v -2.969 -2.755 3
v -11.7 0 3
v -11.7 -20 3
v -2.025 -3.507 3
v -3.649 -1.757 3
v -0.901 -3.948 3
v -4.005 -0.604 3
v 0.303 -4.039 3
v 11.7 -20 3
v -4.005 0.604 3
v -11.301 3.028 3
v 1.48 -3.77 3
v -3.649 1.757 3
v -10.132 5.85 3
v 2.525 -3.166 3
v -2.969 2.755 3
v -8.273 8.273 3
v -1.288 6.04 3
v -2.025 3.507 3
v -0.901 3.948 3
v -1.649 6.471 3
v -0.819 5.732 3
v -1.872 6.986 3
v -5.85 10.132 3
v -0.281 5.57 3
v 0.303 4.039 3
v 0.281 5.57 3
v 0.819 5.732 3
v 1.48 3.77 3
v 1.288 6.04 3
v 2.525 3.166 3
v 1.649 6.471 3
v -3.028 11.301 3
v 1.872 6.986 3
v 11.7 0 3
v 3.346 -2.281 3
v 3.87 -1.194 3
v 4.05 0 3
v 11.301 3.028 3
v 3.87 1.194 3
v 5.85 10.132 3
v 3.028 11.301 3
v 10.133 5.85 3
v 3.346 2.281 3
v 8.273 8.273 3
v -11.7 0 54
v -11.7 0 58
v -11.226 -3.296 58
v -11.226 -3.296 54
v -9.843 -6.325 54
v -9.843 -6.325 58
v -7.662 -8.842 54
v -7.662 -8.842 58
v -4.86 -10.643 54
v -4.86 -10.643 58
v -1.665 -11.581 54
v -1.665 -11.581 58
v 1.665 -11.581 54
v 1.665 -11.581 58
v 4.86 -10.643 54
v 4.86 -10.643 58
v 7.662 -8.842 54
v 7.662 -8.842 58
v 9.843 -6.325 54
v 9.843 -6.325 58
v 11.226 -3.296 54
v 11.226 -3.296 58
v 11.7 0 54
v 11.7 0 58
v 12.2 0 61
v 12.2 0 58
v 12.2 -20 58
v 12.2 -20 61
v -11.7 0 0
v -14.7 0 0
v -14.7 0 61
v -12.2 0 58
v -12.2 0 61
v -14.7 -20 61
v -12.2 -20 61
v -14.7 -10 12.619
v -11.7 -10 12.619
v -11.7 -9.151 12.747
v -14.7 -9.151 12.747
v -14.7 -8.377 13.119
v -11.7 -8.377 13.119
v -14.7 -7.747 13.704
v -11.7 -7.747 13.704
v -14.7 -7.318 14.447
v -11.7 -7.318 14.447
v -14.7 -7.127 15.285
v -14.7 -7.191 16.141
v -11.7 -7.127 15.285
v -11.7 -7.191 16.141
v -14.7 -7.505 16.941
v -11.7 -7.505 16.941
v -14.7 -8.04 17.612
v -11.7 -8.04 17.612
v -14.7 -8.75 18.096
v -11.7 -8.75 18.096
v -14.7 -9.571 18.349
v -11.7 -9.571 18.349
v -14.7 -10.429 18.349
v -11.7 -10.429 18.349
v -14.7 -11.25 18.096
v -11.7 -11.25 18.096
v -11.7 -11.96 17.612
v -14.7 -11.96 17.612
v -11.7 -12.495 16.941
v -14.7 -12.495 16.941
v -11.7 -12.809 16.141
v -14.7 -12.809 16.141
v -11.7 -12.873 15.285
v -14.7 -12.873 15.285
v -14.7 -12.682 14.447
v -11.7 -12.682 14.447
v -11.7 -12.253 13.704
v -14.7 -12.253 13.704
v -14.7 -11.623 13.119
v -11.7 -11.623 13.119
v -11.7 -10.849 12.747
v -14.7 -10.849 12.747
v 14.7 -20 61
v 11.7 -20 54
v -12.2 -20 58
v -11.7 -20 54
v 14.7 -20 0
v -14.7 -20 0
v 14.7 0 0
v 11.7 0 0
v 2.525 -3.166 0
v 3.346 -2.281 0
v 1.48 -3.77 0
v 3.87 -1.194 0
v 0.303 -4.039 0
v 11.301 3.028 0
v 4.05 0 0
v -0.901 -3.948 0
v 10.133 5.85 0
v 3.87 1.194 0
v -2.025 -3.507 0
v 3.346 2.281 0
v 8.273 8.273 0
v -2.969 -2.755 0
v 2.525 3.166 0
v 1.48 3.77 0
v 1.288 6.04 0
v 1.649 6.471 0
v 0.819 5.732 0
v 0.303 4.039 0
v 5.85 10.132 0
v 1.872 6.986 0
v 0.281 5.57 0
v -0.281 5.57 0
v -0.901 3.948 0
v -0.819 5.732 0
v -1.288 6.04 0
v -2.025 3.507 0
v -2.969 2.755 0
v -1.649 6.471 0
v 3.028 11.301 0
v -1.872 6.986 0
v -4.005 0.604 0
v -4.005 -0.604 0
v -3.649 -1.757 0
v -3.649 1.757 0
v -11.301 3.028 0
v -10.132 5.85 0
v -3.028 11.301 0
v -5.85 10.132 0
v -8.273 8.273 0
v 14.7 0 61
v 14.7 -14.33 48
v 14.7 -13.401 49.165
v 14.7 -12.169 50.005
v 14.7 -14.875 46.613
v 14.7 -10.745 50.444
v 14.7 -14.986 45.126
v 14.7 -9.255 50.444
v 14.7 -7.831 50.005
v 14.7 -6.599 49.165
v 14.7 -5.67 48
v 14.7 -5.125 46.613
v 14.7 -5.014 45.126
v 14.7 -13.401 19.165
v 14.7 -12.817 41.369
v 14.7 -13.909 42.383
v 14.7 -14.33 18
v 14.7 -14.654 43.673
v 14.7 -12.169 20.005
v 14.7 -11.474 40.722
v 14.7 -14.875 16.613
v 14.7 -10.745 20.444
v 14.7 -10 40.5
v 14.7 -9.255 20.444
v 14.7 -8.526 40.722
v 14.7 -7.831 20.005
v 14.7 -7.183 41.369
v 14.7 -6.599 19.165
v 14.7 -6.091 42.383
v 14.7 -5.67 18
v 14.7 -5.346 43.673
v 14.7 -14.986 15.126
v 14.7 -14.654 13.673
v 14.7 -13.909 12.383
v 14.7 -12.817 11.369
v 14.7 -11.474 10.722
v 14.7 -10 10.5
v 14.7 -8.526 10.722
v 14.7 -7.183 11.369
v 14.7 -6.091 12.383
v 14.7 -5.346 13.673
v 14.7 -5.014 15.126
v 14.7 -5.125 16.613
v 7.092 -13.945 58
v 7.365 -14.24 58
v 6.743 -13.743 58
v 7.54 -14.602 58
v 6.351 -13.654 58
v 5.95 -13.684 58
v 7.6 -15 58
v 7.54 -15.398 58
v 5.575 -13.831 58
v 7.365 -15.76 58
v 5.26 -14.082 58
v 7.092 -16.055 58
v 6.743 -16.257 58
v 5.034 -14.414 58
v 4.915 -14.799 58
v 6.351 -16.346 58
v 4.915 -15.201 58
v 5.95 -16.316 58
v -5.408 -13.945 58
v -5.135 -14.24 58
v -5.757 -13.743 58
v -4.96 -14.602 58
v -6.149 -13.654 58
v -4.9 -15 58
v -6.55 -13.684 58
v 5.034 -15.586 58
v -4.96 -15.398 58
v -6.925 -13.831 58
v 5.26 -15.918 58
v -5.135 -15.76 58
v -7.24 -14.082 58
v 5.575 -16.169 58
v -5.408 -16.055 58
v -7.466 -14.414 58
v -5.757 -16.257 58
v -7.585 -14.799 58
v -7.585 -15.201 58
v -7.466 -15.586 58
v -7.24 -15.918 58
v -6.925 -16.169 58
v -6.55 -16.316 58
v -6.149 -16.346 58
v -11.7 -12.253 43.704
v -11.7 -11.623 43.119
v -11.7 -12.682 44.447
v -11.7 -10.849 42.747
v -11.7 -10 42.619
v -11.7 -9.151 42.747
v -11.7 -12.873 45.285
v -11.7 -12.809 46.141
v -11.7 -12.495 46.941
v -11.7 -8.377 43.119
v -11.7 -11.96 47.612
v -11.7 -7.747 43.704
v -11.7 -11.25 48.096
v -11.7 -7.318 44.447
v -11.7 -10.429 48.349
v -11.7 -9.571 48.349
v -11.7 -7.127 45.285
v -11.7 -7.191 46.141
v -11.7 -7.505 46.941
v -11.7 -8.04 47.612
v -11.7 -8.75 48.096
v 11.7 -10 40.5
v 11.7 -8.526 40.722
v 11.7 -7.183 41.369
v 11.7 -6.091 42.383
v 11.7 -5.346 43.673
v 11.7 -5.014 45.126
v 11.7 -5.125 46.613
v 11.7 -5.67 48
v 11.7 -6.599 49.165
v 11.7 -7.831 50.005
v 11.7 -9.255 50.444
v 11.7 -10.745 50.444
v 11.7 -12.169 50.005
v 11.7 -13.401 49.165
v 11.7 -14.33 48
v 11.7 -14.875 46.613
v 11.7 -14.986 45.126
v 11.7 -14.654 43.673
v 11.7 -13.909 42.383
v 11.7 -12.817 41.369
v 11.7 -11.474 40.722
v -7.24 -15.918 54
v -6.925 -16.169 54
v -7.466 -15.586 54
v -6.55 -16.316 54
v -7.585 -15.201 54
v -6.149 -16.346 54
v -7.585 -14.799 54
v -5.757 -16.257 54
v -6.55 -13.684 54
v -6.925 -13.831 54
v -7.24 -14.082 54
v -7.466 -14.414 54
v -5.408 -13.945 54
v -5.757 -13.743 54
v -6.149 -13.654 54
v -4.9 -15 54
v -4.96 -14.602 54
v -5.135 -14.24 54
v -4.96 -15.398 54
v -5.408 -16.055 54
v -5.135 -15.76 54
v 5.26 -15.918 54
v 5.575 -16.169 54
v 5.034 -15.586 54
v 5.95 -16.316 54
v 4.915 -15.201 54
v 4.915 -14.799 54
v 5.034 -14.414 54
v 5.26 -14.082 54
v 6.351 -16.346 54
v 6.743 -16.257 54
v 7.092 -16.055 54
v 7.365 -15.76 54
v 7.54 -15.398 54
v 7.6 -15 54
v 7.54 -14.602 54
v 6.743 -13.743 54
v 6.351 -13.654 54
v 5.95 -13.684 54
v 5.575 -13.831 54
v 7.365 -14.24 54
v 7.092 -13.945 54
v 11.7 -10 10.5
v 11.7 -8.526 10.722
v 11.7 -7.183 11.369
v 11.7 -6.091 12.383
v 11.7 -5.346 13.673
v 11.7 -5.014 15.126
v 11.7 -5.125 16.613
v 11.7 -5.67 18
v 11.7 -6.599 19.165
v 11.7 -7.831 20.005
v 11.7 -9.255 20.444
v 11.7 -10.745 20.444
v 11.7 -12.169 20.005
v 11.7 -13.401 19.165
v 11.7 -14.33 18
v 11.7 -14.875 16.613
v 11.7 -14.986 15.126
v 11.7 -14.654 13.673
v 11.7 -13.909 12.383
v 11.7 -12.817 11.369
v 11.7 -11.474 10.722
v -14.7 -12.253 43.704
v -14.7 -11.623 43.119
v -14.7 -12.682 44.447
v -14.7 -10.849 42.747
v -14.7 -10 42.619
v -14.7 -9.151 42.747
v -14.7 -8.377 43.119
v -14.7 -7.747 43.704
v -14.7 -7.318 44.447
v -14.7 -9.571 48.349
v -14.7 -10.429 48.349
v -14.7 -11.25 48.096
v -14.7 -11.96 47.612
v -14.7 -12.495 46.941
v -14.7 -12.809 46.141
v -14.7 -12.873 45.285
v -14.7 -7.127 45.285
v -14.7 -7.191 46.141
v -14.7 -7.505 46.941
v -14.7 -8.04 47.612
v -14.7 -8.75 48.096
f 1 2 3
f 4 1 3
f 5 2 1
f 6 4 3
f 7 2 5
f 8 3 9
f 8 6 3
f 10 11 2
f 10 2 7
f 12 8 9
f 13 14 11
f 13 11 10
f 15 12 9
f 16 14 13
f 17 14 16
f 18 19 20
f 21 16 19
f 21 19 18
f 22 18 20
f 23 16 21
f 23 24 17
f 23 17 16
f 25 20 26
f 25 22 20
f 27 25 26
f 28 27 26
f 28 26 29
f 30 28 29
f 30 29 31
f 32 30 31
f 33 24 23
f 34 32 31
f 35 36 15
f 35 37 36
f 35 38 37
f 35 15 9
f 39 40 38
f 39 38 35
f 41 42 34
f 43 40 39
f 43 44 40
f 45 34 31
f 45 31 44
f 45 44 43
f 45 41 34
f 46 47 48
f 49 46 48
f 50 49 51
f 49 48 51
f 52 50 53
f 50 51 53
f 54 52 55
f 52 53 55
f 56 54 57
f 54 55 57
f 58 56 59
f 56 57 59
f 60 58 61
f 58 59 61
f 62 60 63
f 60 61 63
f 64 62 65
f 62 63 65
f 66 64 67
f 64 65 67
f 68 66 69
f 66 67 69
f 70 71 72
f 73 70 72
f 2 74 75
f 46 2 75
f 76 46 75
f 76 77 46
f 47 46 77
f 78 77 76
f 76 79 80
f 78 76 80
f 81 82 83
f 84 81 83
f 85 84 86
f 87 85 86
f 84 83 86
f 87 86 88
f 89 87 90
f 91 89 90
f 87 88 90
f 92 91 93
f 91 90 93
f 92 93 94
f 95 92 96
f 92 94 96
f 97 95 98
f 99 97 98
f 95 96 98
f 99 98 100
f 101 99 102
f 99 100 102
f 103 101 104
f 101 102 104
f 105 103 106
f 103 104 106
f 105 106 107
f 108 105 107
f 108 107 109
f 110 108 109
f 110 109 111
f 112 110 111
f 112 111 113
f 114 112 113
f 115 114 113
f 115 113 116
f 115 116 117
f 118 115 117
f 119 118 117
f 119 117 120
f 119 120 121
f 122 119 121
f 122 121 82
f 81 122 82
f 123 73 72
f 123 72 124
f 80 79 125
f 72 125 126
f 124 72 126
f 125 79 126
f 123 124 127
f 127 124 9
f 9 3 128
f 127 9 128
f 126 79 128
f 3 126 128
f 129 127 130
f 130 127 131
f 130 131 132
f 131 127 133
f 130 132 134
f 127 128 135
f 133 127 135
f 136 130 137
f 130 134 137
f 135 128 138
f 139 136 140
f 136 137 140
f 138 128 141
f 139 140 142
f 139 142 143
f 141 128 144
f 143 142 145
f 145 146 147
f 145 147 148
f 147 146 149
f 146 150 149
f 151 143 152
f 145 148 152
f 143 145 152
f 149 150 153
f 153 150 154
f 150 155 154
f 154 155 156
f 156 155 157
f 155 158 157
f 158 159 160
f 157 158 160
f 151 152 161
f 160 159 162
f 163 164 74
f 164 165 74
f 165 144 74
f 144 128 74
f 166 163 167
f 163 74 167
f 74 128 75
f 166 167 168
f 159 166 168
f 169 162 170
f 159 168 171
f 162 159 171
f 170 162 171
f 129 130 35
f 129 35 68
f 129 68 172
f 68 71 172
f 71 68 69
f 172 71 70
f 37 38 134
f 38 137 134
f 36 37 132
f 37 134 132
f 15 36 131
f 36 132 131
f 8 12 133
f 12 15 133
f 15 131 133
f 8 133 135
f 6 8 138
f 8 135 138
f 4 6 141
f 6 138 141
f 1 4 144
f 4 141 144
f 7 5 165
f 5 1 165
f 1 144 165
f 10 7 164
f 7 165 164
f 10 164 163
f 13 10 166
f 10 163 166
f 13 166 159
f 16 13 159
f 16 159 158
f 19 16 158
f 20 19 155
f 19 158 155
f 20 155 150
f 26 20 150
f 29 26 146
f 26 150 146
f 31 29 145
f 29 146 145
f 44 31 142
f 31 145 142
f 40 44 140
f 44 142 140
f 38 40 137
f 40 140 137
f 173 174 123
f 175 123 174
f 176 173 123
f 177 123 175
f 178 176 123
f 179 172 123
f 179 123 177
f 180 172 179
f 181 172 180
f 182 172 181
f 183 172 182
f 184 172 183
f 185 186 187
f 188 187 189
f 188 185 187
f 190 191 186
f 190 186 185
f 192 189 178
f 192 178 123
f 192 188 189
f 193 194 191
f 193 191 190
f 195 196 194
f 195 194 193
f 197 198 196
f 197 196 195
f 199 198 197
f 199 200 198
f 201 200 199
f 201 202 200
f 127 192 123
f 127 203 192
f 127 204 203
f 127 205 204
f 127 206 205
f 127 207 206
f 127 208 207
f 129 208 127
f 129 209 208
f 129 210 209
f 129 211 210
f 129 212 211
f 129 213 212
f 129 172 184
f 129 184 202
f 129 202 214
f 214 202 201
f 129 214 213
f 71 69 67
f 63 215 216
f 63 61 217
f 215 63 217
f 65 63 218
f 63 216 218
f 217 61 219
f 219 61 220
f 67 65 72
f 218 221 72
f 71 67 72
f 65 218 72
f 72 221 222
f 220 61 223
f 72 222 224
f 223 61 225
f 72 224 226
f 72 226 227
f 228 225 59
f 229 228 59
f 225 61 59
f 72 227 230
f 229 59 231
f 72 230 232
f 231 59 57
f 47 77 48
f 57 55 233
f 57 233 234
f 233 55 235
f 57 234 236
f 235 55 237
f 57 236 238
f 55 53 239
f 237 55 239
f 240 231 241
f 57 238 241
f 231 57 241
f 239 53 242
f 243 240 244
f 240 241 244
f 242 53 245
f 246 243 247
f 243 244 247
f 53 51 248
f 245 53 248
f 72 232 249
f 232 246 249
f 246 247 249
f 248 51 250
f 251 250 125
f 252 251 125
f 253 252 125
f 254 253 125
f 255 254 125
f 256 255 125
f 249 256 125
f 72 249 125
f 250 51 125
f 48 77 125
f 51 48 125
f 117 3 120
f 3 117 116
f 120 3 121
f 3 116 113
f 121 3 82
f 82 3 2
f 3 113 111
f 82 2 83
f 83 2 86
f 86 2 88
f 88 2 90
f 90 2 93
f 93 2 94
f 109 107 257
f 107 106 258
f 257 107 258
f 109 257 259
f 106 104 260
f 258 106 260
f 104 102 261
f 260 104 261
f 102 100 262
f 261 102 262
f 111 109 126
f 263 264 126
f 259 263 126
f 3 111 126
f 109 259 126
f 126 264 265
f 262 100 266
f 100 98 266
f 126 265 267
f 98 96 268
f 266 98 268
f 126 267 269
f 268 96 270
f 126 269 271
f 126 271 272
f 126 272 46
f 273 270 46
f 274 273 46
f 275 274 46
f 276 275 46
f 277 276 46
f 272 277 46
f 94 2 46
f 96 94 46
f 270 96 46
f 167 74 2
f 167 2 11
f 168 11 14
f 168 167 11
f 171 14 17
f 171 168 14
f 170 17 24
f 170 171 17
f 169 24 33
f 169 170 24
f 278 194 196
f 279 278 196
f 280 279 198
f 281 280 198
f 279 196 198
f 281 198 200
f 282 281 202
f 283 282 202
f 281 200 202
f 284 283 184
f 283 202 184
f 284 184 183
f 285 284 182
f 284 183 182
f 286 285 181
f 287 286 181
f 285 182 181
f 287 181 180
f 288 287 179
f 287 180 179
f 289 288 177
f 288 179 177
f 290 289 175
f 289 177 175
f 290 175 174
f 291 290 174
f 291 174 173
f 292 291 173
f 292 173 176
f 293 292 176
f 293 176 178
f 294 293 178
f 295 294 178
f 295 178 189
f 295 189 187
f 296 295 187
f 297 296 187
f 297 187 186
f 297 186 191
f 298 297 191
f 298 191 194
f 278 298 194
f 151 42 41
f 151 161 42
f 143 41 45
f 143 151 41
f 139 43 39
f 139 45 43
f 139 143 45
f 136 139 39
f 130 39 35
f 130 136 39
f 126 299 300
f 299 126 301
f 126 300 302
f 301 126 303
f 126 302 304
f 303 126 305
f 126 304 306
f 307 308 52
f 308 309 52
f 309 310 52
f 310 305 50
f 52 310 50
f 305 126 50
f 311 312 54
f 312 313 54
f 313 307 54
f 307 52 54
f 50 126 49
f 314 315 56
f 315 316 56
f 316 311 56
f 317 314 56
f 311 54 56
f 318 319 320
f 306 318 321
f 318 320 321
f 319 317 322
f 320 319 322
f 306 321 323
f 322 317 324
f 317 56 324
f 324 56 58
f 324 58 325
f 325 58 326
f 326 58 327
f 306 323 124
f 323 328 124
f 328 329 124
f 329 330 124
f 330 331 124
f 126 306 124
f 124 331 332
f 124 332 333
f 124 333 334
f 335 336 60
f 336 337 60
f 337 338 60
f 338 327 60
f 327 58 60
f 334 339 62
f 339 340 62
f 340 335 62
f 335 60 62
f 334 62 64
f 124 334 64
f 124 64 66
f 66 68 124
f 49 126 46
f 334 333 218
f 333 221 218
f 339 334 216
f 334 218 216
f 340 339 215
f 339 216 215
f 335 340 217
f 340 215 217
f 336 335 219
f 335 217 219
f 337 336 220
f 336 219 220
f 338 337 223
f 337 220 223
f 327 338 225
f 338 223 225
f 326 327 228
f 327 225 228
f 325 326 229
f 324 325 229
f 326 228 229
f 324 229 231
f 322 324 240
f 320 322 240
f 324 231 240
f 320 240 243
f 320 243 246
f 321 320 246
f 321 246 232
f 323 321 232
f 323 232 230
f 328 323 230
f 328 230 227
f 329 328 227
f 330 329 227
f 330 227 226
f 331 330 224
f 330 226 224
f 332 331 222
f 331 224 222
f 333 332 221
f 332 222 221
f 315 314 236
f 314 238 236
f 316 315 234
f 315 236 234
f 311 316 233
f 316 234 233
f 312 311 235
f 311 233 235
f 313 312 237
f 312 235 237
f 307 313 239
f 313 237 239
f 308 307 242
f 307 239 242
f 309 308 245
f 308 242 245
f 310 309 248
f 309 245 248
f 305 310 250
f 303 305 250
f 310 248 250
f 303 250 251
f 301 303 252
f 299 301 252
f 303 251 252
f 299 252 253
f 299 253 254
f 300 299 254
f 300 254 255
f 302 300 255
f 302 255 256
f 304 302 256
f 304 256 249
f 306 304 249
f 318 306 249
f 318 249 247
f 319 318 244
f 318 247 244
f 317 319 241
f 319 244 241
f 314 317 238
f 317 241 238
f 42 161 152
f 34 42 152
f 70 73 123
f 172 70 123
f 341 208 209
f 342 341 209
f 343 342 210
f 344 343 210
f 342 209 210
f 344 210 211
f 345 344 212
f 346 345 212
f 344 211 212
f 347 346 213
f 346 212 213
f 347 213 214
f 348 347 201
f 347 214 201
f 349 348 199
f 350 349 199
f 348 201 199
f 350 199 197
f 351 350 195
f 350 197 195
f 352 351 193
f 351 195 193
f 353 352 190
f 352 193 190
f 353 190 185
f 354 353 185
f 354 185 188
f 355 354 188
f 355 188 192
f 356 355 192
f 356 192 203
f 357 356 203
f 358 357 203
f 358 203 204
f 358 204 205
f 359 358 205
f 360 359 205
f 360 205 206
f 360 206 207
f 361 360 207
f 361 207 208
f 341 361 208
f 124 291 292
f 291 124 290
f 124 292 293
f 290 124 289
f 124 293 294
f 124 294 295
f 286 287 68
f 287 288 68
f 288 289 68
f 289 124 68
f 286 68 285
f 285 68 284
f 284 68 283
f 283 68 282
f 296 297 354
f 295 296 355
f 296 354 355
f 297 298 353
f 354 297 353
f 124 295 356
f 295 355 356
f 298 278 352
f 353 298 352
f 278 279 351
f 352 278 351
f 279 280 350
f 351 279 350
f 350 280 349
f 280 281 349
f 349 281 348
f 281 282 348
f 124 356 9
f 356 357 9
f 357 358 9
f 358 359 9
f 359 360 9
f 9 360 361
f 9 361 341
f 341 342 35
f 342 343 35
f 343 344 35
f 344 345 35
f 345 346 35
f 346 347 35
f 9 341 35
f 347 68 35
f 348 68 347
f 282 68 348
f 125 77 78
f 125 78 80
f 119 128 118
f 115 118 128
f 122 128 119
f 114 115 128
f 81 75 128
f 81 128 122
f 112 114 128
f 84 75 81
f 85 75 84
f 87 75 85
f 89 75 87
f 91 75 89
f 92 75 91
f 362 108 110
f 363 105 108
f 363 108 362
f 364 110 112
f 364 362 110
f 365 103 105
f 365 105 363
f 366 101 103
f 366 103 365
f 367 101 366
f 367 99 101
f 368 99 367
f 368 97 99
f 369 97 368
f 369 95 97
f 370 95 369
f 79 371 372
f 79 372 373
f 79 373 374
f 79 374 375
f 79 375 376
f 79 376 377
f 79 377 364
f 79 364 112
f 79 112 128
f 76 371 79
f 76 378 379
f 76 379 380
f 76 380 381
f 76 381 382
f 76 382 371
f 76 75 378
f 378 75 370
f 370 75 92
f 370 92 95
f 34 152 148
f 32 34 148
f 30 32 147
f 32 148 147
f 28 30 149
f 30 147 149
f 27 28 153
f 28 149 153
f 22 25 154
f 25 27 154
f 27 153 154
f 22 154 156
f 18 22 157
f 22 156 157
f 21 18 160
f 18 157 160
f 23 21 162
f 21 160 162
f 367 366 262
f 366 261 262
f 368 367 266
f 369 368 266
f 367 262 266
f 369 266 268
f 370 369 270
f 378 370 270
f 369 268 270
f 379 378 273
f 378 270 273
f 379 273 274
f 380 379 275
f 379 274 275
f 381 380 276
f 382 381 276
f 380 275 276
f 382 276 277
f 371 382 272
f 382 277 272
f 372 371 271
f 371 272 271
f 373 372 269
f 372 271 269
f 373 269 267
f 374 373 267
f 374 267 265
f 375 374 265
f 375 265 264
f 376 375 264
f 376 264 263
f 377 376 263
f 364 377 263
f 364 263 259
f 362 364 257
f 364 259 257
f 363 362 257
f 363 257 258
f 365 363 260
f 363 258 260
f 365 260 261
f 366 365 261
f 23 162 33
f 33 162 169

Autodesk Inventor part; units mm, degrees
ref_plane "YZ Plane" through (0, 0, 0) normal (1, 0, 0) x (0, 1, 0)
ref_plane "XZ Plane" through (0, 0, 0) normal (0, 1, 0) x (-1, 0, 0)
ref_plane "XY Plane" through (0, 0, 0) normal (0, 0, 1) x (1, 0, 0)
sketch "Sketch1" plane through (0, 0, 0) normal (0, 0, 1) x (1, 0, 0)
  arc A0 (-1.9, 11.5447) -> (-3.0282, 11.3013) centre (0, 0) ccw construction
  line L0 (0, 7.75) -> (0, 0) construction
  arc A1 (1.9, 11.5447) -> (-1.9, 11.5447) centre (0, 0) ccw construction
  circle A2 centre (0, 0) radius 4.05
  line L1 (11.7, 0) -> (11.7, -20)
  line L2 (11.7, -20) -> (-11.7, -20)
  line L3 (-11.7, -20) -> (-11.7, 0)
  arc A3 (11.7, 0) -> (3.0282, 11.3013) centre (0, 0) ccw
  arc A4 (-11.7, 0) -> (11.7, 0) centre (0, 0) ccw construction
  line L4 (3.0282, 11.3013) -> (1.872, 6.9864)
  line L5 (-1.872, 6.9864) -> (-3.0282, 11.3013)
  arc A5 (-1.872, 6.9864) -> (1.872, 6.9864) centre (0, 7.488) ccw
  arc A6 (3.0282, 11.3013) -> (1.9, 11.5447) centre (0, 0) ccw construction
  arc A7 (-3.0282, 11.3013) -> (-11.7, 0) centre (0, 0) ccw
  line L6 (-1.872, 6.9864) -> (0, 0) construction
  line L7 (0, 0) -> (1.872, 6.9864) construction
  line L8 (0, 5.55) -> (0, 4.05) construction
  dimension "d3" = 8.1
  dimension "d0" = 23.4
  dimension "d4" = 20
  dimension "d8" = 30
  dimension "d9" = 1.5
extrude "Extrusion1" add sketch "Sketch1" along normal blind 3
sketch "Sketch2" plane through (-11.7, -20, 0) normal (-1, 0, 0) x (0, 0, 1)
  line L0 (0, 20) -> (58, 20)
  line L1 (58, 20) -> (58, 0)
  line L2 (58, 0) -> (0, 0)
  line L3 (0, 0) -> (0, 20)
  line L4 (0, 0) -> (3, 0) projected
  line L5 (3, 20) -> (3, 0) projected
  dimension "d10" = 55
extrude "Extrusion2" add sketch "Sketch2" along normal blind 3
sketch "Sketch3" plane through (-11.7, -20, 58) normal (0, 0, 1) x (1, 0, 0)
  circle A0 centre (11.7, 20) radius 4.05 construction
  arc A1 (0, 20) -> (23.4, 20) centre (11.7, 20) ccw
  line L0 (23.4, 0) -> (23.4, 20) projected
  line L1 (23.4, 20) -> (23.4, 0)
  line L2 (23.4, 0) -> (0, 0)
  line L3 (23.4, 0) -> (-3, 0) construction
  line L4 (0, 0) -> (0, 20)
extrude "Extrusion3" add sketch "Sketch3" against normal blind 4
sketch "Sketch4" plane through (-14.7, -20, 58) normal (0, 0, 1) x (1, 0, 0)
  circle A0 centre (8.45, 5) radius 1.35
  circle A1 centre (20.95, 5) radius 1.35
  line L0 (8.45, 5) -> (20.95, 5) construction
  line L1 (14.7, 5) -> (14.7, 20) construction
  dimension "d15" = 12.5
  dimension "d16" = 2.7
  dimension "d17" = 15
extrude "Extrusion4" cut sketch "Sketch4" against normal up to surface (4 mm away)
sketch "Sketch5" plane through (11.7, -20, 0) normal (1, 0, 0) x (0, 0, -1)
  line L0 (0, 31.3013) -> (0, 20) construction
  line L1 (0, 20) -> (-58, 20)
  line L2 (-58, 20) -> (-58, 0)
  line L3 (-58, 0) -> (0, 0)
  line L4 (0, 0) -> (0, 20)
extrude "Extrusion5" add sketch "Sketch5" along normal blind 3
sketch "Sketch7" plane through (-14.7, -20, 58) normal (0, 0, 1) x (1, 0, 0)
  line L0 (0, 20) -> (2.5, 20)
  line L1 (2.5, 20) -> (2.5, 0)
  line L2 (2.5, 0) -> (0, 0)
  line L3 (0, 0) -> (0, 20)
  line L4 (29.4, 20) -> (26.9, 20)
  line L5 (26.9, 20) -> (26.9, 0)
  line L6 (26.9, 0) -> (29.4, 0)
  line L7 (29.4, 0) -> (29.4, 20)
  point P0 (14.7, 20)
  dimension "d27" = 2.5
extrude "Extrusion7" add sketch "Sketch7" along normal blind 3
sketch "Sketch6" plane through (14.7, -20, 0) normal (1, 0, 0) x (0, 0, -1)
  line L0 (-45.5, 10) -> (-15.5, 10) construction
  line L1 (-58, 0) -> (0, 0) construction
  circle A0 centre (-45.5, 10) radius 2.8813
  circle A1 centre (-15.5, 10) radius 2.8813
  line L2 (0, 20) -> (-61, 20) construction
  line L3 (-30.5, 20) -> (-30.5, 10) construction
  dimension "d22" = 30
  dimension "d23" = 5.7625
  dimension "d24" = 10
extrude "Extrusion6" cut sketch "Sketch6" against normal through all
sketch "Sketch8" plane through (14.7, -20, 0) normal (1, 0, 0) x (0, 0, -1)
  circle A0 centre (-15.5, 10) radius 5
  circle A1 centre (-45.5, 10) radius 5
  circle A2 centre (-15.5, 10) radius 2.8813 construction
  circle A3 centre (-45.5, 10) radius 2.8813 construction
  point P0 (0, 20)
  dimension "d30" = 10
extrude "Extrusion8" cut sketch "Sketch8" against normal blind 3
properties part number "Xgantry_CableChain_top_connector"
